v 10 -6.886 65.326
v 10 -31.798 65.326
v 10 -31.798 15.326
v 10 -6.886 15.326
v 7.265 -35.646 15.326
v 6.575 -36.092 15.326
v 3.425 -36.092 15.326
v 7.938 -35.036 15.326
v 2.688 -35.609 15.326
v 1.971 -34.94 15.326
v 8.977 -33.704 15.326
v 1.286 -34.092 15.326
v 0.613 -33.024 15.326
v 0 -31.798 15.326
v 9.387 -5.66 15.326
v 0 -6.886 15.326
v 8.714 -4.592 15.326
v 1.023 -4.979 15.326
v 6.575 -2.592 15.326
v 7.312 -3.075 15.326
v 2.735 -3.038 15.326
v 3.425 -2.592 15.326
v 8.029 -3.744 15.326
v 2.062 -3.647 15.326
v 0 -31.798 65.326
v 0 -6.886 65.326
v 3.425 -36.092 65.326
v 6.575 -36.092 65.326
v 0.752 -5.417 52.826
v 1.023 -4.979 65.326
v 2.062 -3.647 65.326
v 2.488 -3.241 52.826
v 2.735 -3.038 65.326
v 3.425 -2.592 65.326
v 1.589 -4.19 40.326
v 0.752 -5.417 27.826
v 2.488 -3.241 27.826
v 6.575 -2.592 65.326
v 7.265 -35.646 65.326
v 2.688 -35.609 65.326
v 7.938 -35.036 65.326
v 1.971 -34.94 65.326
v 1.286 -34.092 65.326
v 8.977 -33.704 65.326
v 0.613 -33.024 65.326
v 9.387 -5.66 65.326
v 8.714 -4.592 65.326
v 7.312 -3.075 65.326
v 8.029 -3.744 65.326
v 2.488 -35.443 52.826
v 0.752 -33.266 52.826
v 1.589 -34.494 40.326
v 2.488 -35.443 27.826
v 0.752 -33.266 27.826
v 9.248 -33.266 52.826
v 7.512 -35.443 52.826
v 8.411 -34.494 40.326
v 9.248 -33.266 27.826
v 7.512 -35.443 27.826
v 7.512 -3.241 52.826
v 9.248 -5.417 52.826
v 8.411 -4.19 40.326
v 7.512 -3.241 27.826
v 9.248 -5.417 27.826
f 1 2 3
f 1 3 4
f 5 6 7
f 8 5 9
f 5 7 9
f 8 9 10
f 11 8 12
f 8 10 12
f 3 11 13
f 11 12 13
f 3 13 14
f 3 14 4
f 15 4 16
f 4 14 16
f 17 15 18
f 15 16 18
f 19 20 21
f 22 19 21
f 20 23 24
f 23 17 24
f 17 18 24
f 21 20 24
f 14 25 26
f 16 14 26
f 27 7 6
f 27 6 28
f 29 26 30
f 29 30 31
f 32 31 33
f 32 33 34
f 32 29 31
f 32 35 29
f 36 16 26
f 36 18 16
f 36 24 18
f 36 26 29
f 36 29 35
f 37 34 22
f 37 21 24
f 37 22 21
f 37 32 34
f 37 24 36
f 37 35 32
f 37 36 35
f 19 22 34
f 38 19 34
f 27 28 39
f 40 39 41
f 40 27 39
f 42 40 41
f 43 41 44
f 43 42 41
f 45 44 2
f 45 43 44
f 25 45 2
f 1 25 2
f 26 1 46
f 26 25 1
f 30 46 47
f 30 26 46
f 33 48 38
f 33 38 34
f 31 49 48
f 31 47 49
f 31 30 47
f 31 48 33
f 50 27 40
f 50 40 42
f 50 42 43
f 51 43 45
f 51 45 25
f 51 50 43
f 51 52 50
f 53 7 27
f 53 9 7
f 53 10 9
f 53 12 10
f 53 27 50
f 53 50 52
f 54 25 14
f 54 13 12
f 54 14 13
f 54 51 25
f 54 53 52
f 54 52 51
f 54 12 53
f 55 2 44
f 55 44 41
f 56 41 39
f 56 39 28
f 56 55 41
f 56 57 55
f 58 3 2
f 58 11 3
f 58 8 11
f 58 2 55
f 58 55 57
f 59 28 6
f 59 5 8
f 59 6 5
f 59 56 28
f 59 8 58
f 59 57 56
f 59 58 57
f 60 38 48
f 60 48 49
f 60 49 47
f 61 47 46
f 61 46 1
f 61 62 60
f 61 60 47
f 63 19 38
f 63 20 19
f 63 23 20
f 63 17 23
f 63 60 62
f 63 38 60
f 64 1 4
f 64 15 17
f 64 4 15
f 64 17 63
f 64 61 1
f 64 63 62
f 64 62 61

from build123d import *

# Parameters (mm, degrees)
F0_W     = 33.5
F0_H     = 50
F1_DEPTH = 10
F3_DEPTH = 50


with BuildPart() as f1:
    # F0 (on Right) → F1 (new body)
    with BuildSketch(Plane.YZ):
        with Locations((-19.3419211172, 40.3263012171)):
            Rectangle(F0_W, F0_H)
    extrude(amount=F1_DEPTH)

    # F2 (on face) → F3 (cut, through all)
    with BuildSketch(Plane(origin=(0, 0, 15.3263012171), x_dir=(1, 0, 0), z_dir=(0, 0, -1))):
        with BuildLine():
            add(Edge.make_bspline(
                [(3.4248817045, 36.0919211172), (1.4606722996, 35.0632699827), (0, 31.7979560777)],
                knots=[0.2183774698, 0.2183774698, 0.2183774698, 0.7583343291, 0.7583343291, 0.7583343291], degree=2, weights=[1, 0.9637766496, 1]))
            Line((3.4248817045, 36.0919211172), (0, 36.0919211172))
            Line((0, 36.0919211172), (0, 31.7979560777))
        make_face()
        with BuildLine():
            Line((0, 6.8858861567), (0, 2.5919211172))
            Line((0, 2.5919211172), (3.4248817045, 2.5919211172))
            add(Edge.make_bspline(
                [(0, 6.8858861567), (1.4606722996, 3.6205722517), (3.4248817045, 2.5919211172)],
                knots=[2.3832583245, 2.3832583245, 2.3832583245, 2.9232151838, 2.9232151838, 2.9232151838], degree=2, weights=[1, 0.9637766496, 1]))
        make_face()
        with BuildLine():
            Line((10, 31.7979560777), (10, 36.0919211172))
            Line((10, 36.0919211172), (6.5751182955, 36.0919211172))
            add(Edge.make_bspline(
                [(10, 31.7979560777), (8.5393277004, 35.0632699827), (6.5751182955, 36.0919211172)],
                knots=[5.5248509781, 5.5248509781, 5.5248509781, 6.0648078373, 6.0648078373, 6.0648078373], degree=2, weights=[1, 0.9637766496, 1]))
        make_face()
        with BuildLine():
            add(Edge.make_bspline(
                [(6.5751182955, 2.5919211172), (8.5393277004, 3.6205722517), (10, 6.8858861567)],
                knots=[3.3599701234, 3.3599701234, 3.3599701234, 3.8999269827, 3.8999269827, 3.8999269827], degree=2, weights=[1, 0.9637766496, 1]))
            Line((6.5751182955, 2.5919211172), (10, 2.5919211172))
            Line((10, 2.5919211172), (10, 6.8858861567))
        make_face()
    extrude(amount=-F3_DEPTH, mode=Mode.SUBTRACT)


solid = f1.part
